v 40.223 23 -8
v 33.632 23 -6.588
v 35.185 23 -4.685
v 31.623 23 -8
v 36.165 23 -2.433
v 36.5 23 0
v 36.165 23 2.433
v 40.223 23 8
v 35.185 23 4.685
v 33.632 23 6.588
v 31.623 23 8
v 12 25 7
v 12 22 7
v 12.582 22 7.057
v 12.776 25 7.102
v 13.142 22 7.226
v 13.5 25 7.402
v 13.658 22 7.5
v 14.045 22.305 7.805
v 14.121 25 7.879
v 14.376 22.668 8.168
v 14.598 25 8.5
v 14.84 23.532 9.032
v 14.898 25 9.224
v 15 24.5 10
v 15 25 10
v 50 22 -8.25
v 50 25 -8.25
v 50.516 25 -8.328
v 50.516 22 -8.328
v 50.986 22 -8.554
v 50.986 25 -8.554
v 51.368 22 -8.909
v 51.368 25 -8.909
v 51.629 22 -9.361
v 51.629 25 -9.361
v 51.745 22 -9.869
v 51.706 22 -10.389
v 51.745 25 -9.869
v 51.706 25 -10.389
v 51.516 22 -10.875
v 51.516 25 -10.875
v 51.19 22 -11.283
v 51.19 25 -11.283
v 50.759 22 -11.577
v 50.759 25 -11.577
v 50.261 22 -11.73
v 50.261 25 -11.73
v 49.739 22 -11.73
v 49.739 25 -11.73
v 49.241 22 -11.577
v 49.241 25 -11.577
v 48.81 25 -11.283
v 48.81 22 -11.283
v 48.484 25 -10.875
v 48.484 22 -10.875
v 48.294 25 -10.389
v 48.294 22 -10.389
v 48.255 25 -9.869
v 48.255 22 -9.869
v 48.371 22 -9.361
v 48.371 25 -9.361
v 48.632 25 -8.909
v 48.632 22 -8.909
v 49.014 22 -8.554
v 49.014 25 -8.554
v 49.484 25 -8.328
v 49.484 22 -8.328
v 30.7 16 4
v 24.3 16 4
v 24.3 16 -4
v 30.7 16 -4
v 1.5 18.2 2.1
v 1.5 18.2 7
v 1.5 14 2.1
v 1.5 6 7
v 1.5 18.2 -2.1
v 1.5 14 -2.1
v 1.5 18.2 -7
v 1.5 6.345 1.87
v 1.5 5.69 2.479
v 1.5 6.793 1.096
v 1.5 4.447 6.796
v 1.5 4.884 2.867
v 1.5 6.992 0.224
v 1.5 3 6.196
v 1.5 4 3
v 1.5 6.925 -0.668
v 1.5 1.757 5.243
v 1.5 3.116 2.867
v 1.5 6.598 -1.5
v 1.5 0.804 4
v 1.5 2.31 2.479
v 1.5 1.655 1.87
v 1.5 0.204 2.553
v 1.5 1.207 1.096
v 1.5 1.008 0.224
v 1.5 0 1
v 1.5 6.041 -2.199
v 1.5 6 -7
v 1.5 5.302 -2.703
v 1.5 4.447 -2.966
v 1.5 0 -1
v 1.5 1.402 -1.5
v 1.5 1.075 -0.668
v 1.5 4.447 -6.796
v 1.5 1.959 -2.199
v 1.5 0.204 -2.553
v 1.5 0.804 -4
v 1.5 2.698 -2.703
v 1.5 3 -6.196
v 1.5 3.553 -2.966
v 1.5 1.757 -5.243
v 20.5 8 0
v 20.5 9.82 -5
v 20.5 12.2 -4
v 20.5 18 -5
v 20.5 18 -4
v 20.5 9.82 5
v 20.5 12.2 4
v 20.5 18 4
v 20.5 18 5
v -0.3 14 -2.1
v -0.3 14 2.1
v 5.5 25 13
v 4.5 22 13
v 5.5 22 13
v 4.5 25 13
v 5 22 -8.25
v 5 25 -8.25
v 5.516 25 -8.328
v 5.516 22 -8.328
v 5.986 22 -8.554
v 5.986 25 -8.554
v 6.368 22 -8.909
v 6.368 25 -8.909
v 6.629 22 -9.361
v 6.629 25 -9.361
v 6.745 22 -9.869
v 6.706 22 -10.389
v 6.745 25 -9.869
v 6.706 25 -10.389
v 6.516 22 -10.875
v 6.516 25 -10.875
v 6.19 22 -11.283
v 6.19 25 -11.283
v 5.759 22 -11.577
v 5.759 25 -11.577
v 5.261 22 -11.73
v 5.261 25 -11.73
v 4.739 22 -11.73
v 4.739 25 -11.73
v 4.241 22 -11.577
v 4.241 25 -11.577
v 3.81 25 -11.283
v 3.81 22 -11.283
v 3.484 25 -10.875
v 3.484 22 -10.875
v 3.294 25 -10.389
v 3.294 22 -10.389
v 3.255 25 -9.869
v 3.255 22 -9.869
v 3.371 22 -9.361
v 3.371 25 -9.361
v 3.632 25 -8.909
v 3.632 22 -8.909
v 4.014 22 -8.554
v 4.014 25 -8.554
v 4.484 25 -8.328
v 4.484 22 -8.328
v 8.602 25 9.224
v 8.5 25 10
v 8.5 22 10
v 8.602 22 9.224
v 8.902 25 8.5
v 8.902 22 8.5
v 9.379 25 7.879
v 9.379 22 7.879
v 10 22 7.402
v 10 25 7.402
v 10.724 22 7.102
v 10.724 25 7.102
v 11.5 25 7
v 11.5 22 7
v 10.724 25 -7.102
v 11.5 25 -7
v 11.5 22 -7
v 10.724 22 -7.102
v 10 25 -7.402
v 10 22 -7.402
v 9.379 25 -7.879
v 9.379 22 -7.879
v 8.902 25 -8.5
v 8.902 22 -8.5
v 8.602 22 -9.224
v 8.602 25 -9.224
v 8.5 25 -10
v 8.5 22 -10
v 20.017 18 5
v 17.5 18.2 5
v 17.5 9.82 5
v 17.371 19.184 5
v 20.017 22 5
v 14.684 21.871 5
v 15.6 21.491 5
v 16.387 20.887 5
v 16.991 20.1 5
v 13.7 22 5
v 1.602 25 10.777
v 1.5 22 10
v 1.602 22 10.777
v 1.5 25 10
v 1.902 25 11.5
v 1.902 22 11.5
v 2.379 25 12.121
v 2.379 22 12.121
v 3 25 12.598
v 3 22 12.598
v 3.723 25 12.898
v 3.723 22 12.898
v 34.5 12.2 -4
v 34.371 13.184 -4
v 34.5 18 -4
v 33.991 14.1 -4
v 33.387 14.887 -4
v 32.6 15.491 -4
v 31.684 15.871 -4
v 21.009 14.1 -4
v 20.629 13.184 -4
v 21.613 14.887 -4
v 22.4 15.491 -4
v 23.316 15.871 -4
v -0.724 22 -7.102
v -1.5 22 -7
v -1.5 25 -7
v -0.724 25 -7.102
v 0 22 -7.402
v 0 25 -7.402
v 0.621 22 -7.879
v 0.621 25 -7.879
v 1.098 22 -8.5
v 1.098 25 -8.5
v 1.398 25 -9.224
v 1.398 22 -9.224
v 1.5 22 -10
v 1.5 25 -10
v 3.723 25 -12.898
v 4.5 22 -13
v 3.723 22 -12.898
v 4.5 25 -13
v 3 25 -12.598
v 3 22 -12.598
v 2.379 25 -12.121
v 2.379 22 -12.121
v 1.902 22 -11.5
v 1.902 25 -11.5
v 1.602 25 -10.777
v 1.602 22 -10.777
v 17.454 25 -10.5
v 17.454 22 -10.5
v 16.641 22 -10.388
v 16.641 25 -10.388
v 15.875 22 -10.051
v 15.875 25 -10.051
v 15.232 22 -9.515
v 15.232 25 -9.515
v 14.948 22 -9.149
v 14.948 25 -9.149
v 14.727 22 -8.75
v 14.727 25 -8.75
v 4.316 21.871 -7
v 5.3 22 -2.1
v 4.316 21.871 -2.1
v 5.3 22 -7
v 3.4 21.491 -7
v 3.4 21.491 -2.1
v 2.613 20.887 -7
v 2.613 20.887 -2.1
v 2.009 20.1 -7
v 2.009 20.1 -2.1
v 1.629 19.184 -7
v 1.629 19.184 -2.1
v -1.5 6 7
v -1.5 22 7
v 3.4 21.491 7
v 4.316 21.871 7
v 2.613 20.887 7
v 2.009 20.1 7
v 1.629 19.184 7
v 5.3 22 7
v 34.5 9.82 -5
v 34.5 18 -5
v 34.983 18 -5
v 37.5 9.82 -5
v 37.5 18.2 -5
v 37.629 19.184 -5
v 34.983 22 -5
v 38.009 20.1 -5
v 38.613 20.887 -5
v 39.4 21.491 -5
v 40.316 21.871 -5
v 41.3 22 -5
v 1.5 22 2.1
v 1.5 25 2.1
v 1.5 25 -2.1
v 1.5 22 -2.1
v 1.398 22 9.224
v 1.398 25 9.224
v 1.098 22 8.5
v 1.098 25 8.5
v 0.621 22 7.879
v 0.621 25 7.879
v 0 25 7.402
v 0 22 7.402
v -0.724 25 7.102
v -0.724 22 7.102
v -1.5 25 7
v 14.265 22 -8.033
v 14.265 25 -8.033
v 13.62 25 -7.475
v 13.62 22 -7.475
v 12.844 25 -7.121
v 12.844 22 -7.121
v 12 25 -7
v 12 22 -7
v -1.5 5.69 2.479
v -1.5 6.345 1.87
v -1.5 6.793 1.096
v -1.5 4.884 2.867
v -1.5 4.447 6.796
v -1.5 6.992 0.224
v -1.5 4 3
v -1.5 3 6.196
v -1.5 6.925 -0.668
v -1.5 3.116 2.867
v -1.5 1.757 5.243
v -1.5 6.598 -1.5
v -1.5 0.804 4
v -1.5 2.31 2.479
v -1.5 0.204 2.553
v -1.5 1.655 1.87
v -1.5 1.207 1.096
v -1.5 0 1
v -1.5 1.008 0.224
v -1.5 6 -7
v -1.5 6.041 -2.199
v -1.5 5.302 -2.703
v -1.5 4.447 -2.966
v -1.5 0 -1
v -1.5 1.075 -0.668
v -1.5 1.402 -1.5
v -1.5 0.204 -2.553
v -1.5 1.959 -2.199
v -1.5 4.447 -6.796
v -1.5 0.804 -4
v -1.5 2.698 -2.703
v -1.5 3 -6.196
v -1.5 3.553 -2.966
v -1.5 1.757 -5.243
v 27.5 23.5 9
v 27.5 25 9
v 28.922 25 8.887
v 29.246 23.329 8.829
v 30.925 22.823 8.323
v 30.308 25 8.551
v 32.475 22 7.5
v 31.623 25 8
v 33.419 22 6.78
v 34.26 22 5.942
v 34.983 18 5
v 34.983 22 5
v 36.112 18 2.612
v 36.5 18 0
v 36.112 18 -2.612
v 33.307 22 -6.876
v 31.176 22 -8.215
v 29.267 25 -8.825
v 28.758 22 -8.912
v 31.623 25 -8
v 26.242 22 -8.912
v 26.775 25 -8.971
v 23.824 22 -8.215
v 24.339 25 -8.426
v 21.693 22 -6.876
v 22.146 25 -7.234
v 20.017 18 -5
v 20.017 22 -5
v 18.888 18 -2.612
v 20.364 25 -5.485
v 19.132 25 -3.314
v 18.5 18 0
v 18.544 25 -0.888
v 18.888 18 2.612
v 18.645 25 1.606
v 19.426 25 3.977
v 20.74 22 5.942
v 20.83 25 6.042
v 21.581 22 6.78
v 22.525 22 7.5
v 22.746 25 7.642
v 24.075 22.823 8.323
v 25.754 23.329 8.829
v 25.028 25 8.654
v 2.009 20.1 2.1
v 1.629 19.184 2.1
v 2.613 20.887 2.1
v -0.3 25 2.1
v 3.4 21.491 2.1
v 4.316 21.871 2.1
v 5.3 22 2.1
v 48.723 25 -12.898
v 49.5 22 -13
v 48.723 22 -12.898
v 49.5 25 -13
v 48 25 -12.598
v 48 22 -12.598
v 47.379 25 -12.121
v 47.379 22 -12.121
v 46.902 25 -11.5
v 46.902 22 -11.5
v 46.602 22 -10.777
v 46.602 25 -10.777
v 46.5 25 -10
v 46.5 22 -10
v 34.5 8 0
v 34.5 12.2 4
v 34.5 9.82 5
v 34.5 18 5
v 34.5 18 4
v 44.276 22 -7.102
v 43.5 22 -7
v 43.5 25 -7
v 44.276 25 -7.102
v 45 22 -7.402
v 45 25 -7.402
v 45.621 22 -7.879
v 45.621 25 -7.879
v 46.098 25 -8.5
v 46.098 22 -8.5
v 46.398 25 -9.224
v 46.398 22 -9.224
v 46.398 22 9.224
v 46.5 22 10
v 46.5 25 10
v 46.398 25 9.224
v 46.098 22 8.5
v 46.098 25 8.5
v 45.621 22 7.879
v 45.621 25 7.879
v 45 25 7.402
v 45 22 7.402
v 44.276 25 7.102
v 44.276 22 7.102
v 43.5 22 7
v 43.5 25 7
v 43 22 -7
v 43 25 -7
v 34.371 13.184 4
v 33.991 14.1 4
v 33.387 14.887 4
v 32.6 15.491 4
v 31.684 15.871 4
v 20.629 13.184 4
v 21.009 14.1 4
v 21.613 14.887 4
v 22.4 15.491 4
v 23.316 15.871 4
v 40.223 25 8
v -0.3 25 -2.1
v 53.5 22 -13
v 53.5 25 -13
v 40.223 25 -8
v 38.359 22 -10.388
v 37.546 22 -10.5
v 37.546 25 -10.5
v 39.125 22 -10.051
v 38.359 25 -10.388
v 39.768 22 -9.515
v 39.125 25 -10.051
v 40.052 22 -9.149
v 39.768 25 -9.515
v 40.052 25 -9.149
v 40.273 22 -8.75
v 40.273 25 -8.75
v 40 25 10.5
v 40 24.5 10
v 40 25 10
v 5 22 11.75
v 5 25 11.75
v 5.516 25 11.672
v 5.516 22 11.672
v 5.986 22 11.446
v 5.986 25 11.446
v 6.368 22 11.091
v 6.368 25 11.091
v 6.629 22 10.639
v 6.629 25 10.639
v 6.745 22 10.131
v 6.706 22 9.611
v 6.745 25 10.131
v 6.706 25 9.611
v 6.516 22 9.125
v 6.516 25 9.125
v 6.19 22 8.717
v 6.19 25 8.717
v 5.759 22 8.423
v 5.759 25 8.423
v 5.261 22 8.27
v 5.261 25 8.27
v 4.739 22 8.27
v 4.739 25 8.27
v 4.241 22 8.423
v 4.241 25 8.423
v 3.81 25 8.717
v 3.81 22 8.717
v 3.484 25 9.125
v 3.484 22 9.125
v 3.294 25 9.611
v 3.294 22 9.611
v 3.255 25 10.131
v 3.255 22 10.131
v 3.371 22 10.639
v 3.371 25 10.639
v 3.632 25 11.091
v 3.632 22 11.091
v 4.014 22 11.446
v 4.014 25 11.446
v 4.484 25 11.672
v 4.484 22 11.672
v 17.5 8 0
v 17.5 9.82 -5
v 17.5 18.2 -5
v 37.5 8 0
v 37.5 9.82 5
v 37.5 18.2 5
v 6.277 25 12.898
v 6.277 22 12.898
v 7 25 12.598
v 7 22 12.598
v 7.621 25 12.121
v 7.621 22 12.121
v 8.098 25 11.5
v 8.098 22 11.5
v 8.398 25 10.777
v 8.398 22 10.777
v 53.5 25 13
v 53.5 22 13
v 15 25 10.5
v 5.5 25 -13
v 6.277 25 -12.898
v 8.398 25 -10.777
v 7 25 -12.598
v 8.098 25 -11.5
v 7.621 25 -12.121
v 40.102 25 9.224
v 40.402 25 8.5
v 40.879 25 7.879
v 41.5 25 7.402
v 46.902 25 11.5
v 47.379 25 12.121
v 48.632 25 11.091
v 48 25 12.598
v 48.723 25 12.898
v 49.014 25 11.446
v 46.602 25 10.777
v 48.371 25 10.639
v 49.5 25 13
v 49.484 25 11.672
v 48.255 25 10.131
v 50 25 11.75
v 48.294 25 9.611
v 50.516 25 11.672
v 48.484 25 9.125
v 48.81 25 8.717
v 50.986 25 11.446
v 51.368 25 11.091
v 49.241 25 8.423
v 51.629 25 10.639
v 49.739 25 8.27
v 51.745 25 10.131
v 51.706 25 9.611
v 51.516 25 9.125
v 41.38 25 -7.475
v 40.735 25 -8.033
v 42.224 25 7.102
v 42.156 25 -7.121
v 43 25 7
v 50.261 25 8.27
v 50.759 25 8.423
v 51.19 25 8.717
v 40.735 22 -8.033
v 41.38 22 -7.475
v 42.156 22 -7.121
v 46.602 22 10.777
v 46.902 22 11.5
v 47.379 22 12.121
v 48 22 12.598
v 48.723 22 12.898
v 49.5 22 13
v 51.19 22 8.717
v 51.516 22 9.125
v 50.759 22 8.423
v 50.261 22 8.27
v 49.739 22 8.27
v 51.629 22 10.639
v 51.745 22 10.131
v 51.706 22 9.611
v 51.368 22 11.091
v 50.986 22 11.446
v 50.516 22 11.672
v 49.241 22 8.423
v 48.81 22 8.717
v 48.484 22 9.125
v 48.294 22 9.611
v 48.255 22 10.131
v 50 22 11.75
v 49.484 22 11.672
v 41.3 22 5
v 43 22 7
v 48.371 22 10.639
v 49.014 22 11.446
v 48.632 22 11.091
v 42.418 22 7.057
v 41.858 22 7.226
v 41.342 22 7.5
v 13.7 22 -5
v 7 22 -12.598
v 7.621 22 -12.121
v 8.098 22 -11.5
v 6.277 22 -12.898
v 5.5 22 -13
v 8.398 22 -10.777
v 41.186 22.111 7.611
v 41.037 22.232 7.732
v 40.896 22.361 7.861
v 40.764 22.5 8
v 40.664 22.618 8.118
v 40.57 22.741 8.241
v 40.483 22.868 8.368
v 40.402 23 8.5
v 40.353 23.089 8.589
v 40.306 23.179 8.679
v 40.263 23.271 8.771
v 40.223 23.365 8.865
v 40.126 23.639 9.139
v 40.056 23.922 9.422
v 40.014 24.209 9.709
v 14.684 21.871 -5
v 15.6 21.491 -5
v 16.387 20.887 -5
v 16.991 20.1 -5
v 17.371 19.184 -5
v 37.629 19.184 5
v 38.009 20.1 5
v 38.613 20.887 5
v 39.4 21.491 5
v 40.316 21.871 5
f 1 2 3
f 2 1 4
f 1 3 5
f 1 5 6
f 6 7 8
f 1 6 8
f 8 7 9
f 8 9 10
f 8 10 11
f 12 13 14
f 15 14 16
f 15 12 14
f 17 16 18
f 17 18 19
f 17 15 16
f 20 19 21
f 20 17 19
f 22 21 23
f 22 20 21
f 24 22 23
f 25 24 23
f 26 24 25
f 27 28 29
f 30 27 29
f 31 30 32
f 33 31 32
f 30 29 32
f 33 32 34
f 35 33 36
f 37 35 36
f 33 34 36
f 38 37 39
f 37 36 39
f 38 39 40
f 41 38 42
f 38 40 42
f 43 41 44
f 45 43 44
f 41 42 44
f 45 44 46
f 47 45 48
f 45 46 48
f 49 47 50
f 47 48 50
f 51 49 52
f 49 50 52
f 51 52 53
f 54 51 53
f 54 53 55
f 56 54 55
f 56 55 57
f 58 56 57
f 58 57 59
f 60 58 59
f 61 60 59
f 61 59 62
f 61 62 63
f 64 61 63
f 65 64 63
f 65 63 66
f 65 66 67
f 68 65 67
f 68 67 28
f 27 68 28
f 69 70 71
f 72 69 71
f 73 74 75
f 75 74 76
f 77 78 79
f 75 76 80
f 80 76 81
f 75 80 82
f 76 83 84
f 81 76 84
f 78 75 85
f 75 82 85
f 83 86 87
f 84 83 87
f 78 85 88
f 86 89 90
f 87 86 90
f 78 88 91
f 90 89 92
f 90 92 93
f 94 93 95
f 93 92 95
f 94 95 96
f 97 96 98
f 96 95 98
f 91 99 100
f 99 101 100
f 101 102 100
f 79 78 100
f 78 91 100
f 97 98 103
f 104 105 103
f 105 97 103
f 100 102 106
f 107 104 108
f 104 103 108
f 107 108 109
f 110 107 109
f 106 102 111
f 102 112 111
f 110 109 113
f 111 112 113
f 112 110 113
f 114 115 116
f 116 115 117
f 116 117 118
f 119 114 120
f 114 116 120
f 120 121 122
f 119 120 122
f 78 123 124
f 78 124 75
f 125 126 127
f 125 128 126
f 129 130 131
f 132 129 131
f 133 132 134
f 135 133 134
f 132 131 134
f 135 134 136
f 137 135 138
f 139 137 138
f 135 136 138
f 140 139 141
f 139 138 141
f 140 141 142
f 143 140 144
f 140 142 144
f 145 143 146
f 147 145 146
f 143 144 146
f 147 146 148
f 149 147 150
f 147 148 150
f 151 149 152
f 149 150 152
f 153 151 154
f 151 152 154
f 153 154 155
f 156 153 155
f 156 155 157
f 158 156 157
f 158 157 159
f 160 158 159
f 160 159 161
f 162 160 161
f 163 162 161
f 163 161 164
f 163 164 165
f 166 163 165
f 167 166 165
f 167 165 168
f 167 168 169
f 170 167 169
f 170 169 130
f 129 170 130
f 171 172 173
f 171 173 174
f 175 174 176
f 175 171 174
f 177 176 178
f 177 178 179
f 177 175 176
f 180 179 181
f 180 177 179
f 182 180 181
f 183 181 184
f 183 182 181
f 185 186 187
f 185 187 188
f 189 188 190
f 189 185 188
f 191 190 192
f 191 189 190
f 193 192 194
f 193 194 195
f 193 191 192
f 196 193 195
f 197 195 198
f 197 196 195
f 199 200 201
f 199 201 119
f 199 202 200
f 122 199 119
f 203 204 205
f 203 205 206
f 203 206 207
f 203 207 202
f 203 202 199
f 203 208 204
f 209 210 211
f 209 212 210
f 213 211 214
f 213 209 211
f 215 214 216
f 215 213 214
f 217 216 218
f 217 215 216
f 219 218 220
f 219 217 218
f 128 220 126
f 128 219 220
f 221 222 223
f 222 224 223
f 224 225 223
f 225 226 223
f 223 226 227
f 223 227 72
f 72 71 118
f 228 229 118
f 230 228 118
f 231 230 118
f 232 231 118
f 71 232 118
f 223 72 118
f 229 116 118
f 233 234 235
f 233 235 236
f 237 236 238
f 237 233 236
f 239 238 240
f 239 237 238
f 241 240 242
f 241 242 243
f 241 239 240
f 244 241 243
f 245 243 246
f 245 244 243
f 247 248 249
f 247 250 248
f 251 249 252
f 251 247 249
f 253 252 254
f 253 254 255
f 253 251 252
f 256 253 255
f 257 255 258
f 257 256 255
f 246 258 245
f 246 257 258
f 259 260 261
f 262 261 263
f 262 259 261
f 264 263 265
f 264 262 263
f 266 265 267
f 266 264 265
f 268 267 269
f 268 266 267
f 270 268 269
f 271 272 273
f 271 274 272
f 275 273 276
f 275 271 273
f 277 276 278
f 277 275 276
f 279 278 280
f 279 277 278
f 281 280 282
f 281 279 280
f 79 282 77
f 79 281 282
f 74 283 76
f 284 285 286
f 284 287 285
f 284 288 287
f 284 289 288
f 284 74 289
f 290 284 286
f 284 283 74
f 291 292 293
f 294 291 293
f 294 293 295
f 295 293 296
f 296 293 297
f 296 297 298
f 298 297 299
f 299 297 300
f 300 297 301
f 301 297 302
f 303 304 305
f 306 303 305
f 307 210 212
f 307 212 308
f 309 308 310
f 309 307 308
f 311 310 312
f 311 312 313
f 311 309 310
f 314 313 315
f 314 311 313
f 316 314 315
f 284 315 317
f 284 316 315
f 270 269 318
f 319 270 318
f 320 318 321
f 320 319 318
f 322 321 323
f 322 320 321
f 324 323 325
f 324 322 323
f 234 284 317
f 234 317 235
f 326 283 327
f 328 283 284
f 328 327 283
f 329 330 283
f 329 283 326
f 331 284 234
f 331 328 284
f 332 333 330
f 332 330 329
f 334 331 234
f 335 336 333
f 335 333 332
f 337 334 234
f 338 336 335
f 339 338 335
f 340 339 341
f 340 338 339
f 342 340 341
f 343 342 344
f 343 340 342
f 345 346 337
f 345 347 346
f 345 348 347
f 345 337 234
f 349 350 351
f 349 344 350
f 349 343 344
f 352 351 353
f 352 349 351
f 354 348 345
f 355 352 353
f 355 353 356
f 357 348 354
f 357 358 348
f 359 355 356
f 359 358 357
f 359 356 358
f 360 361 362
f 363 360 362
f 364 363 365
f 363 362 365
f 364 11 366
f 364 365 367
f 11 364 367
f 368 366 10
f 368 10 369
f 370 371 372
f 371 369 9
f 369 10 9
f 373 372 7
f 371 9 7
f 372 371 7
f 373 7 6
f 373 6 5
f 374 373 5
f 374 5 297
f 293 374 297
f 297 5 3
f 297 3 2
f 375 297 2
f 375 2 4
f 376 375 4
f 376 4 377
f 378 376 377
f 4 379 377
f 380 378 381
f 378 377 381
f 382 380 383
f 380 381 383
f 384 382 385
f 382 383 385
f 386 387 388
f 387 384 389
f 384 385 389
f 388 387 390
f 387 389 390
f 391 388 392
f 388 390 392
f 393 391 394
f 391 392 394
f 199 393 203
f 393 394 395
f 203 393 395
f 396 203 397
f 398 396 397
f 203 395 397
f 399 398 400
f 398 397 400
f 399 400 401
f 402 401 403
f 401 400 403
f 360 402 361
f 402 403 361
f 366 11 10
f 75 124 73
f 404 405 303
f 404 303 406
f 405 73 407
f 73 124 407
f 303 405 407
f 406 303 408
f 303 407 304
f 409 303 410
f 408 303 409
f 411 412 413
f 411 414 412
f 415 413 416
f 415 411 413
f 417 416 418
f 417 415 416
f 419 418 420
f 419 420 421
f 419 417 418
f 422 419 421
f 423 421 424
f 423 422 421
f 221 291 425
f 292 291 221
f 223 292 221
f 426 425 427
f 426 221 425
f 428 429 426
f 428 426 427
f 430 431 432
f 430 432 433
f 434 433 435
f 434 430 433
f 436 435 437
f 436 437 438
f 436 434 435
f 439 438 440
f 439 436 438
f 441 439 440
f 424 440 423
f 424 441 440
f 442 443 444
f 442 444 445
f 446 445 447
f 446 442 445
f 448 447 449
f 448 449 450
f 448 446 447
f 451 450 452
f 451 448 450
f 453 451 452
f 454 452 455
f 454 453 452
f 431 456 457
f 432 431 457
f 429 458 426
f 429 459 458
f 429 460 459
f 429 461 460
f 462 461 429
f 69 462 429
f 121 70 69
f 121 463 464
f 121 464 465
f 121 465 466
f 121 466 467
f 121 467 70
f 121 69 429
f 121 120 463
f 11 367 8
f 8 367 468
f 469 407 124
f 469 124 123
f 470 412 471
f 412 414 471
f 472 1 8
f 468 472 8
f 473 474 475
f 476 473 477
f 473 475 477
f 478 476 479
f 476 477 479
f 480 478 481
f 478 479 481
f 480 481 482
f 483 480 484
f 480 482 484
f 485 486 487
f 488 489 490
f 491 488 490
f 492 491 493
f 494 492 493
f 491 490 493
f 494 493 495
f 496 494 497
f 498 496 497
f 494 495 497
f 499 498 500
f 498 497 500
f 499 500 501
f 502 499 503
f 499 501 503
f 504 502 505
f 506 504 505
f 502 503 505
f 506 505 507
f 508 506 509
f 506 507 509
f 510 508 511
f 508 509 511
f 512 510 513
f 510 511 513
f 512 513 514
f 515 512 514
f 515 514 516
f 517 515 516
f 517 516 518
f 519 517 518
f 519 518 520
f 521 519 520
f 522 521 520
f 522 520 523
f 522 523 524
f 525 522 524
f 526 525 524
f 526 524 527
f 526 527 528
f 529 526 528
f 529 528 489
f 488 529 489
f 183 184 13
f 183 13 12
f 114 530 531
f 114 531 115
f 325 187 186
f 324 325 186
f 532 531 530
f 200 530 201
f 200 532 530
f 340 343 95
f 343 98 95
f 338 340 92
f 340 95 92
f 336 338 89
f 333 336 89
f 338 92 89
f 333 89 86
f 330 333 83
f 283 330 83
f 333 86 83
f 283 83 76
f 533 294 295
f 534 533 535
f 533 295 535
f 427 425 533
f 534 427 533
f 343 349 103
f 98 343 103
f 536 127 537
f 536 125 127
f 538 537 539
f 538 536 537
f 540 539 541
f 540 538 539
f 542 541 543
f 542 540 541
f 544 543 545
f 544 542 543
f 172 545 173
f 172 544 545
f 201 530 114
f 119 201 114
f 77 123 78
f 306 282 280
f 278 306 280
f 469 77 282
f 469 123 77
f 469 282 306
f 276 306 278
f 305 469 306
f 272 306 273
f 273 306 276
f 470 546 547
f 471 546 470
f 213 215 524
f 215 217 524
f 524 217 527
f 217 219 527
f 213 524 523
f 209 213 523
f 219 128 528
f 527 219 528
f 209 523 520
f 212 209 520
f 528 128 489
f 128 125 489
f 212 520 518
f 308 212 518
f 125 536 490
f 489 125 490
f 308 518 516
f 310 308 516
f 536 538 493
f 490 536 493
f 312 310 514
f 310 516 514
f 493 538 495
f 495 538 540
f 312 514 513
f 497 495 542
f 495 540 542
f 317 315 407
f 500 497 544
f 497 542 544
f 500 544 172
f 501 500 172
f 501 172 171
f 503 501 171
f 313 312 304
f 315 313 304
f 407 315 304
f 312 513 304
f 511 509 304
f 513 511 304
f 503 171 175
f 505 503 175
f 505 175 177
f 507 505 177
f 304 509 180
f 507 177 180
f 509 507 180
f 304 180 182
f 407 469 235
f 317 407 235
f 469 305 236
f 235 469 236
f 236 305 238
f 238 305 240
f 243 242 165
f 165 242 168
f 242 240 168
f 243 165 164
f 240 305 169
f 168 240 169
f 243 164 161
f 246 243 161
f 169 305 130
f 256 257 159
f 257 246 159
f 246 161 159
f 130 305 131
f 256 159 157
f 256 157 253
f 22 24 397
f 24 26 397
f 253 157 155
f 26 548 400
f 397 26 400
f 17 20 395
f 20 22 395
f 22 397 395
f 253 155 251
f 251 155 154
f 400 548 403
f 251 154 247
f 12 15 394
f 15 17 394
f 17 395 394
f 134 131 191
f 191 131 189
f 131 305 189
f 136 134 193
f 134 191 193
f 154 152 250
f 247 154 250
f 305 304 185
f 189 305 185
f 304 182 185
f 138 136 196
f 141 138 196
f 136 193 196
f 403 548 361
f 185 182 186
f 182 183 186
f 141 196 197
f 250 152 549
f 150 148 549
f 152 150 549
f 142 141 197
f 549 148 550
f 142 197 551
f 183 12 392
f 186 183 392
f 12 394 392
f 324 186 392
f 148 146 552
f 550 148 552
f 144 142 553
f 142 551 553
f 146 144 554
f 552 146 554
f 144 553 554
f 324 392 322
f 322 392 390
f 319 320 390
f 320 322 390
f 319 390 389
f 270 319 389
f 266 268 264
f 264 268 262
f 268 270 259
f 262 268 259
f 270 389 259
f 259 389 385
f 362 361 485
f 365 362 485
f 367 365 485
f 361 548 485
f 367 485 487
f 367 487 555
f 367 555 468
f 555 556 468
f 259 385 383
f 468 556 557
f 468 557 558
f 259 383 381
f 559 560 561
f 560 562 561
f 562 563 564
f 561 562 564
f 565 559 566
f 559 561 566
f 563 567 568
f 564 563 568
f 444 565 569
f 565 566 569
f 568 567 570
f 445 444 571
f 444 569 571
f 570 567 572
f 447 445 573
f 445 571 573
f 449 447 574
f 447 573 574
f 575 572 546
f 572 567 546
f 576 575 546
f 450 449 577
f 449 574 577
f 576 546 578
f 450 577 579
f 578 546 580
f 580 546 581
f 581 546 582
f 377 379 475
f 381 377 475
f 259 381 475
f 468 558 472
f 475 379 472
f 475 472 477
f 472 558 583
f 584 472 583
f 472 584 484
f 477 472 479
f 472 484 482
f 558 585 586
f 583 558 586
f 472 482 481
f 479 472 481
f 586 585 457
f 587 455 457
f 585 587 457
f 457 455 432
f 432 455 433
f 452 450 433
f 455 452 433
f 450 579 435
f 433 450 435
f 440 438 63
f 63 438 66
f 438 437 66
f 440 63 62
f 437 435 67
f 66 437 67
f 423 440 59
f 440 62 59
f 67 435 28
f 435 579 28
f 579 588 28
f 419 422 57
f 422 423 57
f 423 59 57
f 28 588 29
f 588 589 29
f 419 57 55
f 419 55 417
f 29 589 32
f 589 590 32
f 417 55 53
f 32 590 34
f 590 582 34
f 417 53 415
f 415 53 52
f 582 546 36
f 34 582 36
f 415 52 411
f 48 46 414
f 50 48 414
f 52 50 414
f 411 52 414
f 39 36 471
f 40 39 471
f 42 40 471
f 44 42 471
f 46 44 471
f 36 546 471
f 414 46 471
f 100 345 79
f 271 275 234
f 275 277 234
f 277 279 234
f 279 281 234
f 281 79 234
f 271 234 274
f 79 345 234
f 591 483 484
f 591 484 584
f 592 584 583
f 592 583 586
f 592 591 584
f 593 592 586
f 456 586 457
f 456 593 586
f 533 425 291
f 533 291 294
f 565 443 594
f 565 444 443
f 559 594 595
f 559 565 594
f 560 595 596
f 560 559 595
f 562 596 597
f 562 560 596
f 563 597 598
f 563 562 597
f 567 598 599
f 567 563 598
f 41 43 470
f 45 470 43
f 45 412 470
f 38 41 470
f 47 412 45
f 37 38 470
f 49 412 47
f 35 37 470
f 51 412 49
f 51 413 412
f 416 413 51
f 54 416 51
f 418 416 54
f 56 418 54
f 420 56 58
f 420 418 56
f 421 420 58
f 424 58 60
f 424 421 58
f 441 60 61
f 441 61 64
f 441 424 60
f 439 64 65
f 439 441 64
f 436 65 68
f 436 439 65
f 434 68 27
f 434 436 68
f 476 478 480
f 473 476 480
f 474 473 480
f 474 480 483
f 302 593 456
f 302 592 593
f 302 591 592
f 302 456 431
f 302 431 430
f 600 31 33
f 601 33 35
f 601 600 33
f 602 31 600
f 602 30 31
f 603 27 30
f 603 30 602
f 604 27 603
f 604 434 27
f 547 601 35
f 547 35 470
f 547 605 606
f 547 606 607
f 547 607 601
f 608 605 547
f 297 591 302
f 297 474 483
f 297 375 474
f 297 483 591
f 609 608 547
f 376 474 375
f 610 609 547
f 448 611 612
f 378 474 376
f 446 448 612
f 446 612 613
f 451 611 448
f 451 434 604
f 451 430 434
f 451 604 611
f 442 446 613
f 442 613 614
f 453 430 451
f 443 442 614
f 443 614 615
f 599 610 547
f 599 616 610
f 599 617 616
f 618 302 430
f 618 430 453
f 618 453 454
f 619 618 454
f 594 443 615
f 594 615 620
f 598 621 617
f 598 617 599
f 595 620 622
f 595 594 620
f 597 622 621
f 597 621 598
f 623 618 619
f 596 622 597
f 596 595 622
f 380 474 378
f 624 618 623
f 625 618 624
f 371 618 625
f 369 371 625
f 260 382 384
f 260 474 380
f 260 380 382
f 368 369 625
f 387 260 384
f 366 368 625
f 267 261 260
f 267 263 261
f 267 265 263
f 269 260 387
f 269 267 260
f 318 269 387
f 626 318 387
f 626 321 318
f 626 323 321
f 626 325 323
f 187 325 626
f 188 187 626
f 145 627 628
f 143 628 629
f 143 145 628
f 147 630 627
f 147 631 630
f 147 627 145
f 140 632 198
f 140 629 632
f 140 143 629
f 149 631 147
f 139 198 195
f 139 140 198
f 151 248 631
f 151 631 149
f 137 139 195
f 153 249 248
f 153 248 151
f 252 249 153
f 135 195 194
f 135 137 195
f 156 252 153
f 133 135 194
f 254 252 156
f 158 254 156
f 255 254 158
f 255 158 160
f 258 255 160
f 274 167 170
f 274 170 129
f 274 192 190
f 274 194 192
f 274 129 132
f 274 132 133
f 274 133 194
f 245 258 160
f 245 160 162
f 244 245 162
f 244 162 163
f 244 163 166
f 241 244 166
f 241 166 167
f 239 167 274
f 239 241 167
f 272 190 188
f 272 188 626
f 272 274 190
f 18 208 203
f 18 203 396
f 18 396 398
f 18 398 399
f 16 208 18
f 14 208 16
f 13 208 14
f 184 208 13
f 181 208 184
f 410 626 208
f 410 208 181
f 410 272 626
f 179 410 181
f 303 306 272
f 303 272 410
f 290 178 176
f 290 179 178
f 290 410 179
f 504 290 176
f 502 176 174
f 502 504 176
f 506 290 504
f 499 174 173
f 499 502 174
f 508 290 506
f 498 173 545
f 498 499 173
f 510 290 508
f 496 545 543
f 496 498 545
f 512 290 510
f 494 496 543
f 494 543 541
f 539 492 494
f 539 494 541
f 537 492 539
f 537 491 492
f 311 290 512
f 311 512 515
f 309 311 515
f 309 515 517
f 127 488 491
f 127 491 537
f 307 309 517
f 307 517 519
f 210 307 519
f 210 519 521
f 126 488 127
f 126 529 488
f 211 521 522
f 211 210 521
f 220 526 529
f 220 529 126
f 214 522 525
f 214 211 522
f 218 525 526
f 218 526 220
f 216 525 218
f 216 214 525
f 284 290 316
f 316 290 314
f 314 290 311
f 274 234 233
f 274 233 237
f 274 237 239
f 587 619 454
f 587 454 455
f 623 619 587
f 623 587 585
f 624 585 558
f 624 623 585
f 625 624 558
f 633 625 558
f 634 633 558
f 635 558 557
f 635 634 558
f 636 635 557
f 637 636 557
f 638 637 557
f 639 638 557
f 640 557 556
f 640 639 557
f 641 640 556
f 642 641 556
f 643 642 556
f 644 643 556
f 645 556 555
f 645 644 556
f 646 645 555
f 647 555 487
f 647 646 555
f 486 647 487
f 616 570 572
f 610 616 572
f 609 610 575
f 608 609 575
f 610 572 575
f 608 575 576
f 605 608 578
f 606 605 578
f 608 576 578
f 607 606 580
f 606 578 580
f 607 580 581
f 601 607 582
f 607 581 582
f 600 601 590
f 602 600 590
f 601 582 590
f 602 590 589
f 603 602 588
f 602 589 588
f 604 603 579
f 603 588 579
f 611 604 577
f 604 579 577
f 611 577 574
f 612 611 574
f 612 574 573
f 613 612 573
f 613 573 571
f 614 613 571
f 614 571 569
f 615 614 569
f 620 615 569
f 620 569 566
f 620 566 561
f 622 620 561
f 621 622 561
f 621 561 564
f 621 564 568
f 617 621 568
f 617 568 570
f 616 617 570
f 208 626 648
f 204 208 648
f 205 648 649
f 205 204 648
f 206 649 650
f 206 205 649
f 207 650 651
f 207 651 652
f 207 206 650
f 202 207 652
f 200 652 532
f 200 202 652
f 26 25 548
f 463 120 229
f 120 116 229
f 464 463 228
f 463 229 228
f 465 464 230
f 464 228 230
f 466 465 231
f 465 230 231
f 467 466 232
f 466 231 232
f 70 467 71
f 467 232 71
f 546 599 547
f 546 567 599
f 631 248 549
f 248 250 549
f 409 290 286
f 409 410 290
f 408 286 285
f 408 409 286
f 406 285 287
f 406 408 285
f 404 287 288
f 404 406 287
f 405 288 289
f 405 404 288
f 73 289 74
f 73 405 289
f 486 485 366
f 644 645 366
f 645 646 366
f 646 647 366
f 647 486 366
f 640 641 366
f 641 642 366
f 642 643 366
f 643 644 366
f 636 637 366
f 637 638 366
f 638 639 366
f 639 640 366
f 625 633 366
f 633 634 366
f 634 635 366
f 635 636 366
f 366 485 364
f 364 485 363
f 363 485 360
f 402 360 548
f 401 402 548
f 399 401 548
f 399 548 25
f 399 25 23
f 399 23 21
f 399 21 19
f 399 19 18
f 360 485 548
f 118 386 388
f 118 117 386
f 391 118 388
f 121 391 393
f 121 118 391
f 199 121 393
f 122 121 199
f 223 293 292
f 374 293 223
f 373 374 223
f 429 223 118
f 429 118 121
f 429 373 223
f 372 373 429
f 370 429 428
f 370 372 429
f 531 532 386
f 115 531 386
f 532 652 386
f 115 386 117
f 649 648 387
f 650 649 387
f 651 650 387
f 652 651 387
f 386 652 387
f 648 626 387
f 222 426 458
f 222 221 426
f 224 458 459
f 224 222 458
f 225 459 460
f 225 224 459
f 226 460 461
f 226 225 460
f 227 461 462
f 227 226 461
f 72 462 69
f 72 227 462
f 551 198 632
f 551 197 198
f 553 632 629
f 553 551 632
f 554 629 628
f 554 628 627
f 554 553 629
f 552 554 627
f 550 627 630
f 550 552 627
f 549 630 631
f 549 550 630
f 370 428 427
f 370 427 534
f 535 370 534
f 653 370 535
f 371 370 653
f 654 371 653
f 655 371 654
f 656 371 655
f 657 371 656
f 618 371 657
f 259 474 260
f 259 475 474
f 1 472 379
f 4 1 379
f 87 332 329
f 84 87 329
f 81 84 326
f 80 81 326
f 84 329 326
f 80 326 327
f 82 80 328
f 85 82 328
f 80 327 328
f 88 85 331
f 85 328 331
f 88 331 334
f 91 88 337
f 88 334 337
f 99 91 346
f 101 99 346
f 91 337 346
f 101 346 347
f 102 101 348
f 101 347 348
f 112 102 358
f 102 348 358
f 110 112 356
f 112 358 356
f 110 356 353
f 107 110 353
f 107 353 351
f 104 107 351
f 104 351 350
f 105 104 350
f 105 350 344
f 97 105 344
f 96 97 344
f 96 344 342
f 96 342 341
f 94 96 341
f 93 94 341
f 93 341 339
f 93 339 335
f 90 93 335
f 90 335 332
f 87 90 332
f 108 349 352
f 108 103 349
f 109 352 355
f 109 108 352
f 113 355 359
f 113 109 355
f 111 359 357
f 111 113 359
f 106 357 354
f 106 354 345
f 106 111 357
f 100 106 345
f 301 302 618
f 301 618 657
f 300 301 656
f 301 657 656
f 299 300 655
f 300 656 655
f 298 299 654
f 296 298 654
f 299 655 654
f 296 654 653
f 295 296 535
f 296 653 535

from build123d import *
from OCP.BRepFilletAPI import BRepFilletAPI_MakeChamfer

# Parameters (mm, degrees)
SKETCH1_W           = 3
SKETCH1_H           = 14
BOSS_EXTRUDE1_DEPTH = 25
SKETCH2_R           = 3
CUT_EXTRUDE1_DEPTH  = 27.134268691
SKETCH3_W           = 14
SKETCH3_H           = 3
BOSS_EXTRUDE2_DEPTH = 52
SKETCH4_W           = 3
SKETCH4_H           = 10
BOSS_EXTRUDE3_DEPTH = 14
CHAMFER1_SIZE       = 1.819851171
CHAMFER1_SIZE_2     = 5
SKETCH6_W           = 25
SKETCH6_H           = 3
BOSS_EXTRUDE5_DEPTH = 3.5
SKETCH5_W           = 7
SKETCH5_H           = 3
BOSS_EXTRUDE4_DEPTH = 6
SKETCH7_R           = 9
CUT_EXTRUDE2_DEPTH  = 7
CHAMFER2_SIZE       = 3
SKETCH8_W           = 8
SKETCH8_H           = 2
BOSS_EXTRUDE6_DEPTH = 14
SKETCH9_W           = 8.6
SKETCH9_H           = 16
CUT_EXTRUDE3_DEPTH  = 2
CUT_EXTRUDE4_REACH  = 62.467
SKETCH10_R          = 1.75
SKETCH11_W          = 1.8
SKETCH11_H          = 4.2
CUT_EXTRUDE5_DEPTH  = 11
FILLET1_R           = 3
FILLET2_R           = 3
FILLET3_R           = 3.8
FILLET4_R           = 6


# Some blends are built 0.0001 mm under size
with BuildPart() as part:
    # Sketch1 → Boss-Extrude1 (new body)
    with BuildSketch(Plane(origin=(0, 0, 0), x_dir=(1, 0, 0), z_dir=(0, 1, 0))):
        Rectangle(SKETCH1_W, SKETCH1_H)
    extrude(amount=BOSS_EXTRUDE1_DEPTH)

    # Sketch2 → Cut-Extrude1 (cut, through all)
    with BuildSketch(Plane.ZY.offset(1.5)):
        with Locations((0, 4)):
            Circle(SKETCH2_R)
    extrude(amount=-CUT_EXTRUDE1_DEPTH, mode=Mode.SUBTRACT)

    # Sketch3 → Boss-Extrude2 (add)
    with BuildSketch(Plane(origin=(1.5, 0, 0), x_dir=(0, 0, -1), z_dir=(1, 0, 0))):
        with Locations((0, 23.5)):
            Rectangle(SKETCH3_W, SKETCH3_H)
    extrude(amount=BOSS_EXTRUDE2_DEPTH)

    # Sketch4 → Boss-Extrude3 (add)
    with BuildSketch(Plane.XZ.offset(-22)):
        with Locations((36, 0)):
            Rectangle(SKETCH4_W, SKETCH4_H)
        with Locations((19, 0)):
            Rectangle(SKETCH4_W, SKETCH4_H)
    extrude(amount=BOSS_EXTRUDE3_DEPTH)

    # Chamfer1
    chamfer1_edges_1 = [part.edges().sort_by_distance(p)[0] for p in [
        (36, 8, -5),
    ]]
    chamfer1_side_1 = [part.faces().sort_by_distance(p)[0] for p in [
        (36, 8.036397023, -5),
    ]]
    chamfer1_edges_2 = [part.edges().sort_by_distance(p)[0] for p in [
        (36, 8, 5),
    ]]
    chamfer1_side_2 = [part.faces().sort_by_distance(p)[0] for p in [
        (36, 8.036397023, 5),
    ]]
    chamfer1_edges_3 = [part.edges().sort_by_distance(p)[0] for p in [
        (19, 8, 5),
    ]]
    chamfer1_side_3 = [part.faces().sort_by_distance(p)[0] for p in [
        (19, 8.036397023, 5),
    ]]
    chamfer1_edges_4 = [part.edges().sort_by_distance(p)[0] for p in [
        (19, 8, -5),
    ]]
    chamfer1_side_4 = [part.faces().sort_by_distance(p)[0] for p in [
        (19, 8.036397023, -5),
    ]]
    chamfer1 = BRepFilletAPI_MakeChamfer(part.part.solid().wrapped)
    for e in chamfer1_edges_1:
        chamfer1.Add(CHAMFER1_SIZE - 0.0001, CHAMFER1_SIZE_2 - 0.0001, e.wrapped, chamfer1_side_1[0].wrapped)
    for e in chamfer1_edges_2:
        chamfer1.Add(CHAMFER1_SIZE - 0.0001, CHAMFER1_SIZE_2 - 0.0001, e.wrapped, chamfer1_side_2[0].wrapped)
    for e in chamfer1_edges_3:
        chamfer1.Add(CHAMFER1_SIZE - 0.0001, CHAMFER1_SIZE_2 - 0.0001, e.wrapped, chamfer1_side_3[0].wrapped)
    for e in chamfer1_edges_4:
        chamfer1.Add(CHAMFER1_SIZE - 0.0001, CHAMFER1_SIZE_2 - 0.0001, e.wrapped, chamfer1_side_4[0].wrapped)
    add(Compound.cast(chamfer1.Shape()), mode=Mode.REPLACE)  # a hair under: the kernel refuses the full size

    # Sketch6 → Boss-Extrude5 (add)
    with BuildSketch(Plane(origin=(0, 0, -7), x_dir=(-1, 0, 0), z_dir=(0, 0, -1))):
        with Locations((-27.5, 23.5)):
            Rectangle(SKETCH6_W, SKETCH6_H)
    boss_extrude5 = extrude(amount=BOSS_EXTRUDE5_DEPTH)

    # Sketch5 → Boss-Extrude4 (add)
    with BuildSketch(Plane.XY.offset(7)):
        with Locations((5, 23.5)):
            Rectangle(SKETCH5_W, SKETCH5_H)
        with Locations((50, 23.5)):
            Rectangle(SKETCH5_W, SKETCH5_H)
    boss_extrude4 = extrude(amount=BOSS_EXTRUDE4_DEPTH)

    # Mirror1: Boss-Extrude5, Boss-Extrude4 across plane
    add(boss_extrude5.mirror(Plane.XY))
    add(boss_extrude4.mirror(Plane.XY))

    # Sketch7 → Cut-Extrude2 (cut)
    with BuildSketch(Plane(origin=(0, 25, 0), x_dir=(1, 0, 0), z_dir=(0, 1, 0))):
        with Locations(Location((27.5, 0, 0), (0, 0, 270))):
            Circle(SKETCH7_R)
    extrude(amount=-CUT_EXTRUDE2_DEPTH, mode=Mode.SUBTRACT)

    # Chamfer2
    # the kernel refuses this chamfer: 3 mm, written as the material it takes off along each edge
    with BuildSketch(Plane(origin=(15, 22, 10.5), x_dir=(0, -0.027495876610587926, -0.9996219169112968), z_dir=(1, 0, 0))) as chamfer2_piece_1:
        Polygon((CHAMFER2_SIZE * 0.999621916911, CHAMFER2_SIZE * 0.0274958766106), (-CHAMFER2_SIZE * 0.0274958766106, CHAMFER2_SIZE * 0.999621916911), (0, 0), align=None)
    extrude(amount=25, mode=Mode.SUBTRACT)

    # Sketch8 → Boss-Extrude6 (add)
    with BuildSketch(Plane(origin=(20.5, 0, 0), x_dir=(0, 0, -1), z_dir=(1, 0, 0))):
        with Locations((0, 17)):
            Rectangle(SKETCH8_W, SKETCH8_H)
    extrude(amount=BOSS_EXTRUDE6_DEPTH)

    # Sketch9 → Cut-Extrude3 (cut)
    with BuildSketch(Plane(origin=(0, 25, 0), x_dir=(1, 0, 0), z_dir=(0, 1, 0))):
        with Locations((35.923105626, 0)):
            Rectangle(SKETCH9_W, SKETCH9_H)
    extrude(amount=-CUT_EXTRUDE3_DEPTH, mode=Mode.SUBTRACT)

    # Sketch10 → Cut-Extrude4 (cut, up to next)
    with BuildSketch(Plane(origin=(0, 25, 0), x_dir=(1, 0, 0), z_dir=(0, 1, 0)), mode=Mode.PRIVATE) as cut_extrude4_sk1:
        with Locations(Location((5, -10, 0), (0, 0, 270))):
            Circle(SKETCH10_R)
    cut_extrude4_tool1 = extrude(cut_extrude4_sk1.sketch, amount=-CUT_EXTRUDE4_REACH, mode=Mode.PRIVATE) & part.part
    # Sketch10 → Cut-Extrude4 (cut, up to next)
    with BuildSketch(Plane(origin=(0, 25, 0), x_dir=(1, 0, 0), z_dir=(0, 1, 0)), mode=Mode.PRIVATE) as cut_extrude4_sk2:
        with Locations(Location((50, -10, 0), (0, 0, 270))):
            Circle(SKETCH10_R)
    cut_extrude4_tool2 = extrude(cut_extrude4_sk2.sketch, amount=-CUT_EXTRUDE4_REACH, mode=Mode.PRIVATE) & part.part
    # Sketch10 → Cut-Extrude4 (cut, up to next)
    with BuildSketch(Plane(origin=(0, 25, 0), x_dir=(1, 0, 0), z_dir=(0, 1, 0)), mode=Mode.PRIVATE) as cut_extrude4_sk3:
        with Locations(Location((50, 10, 0), (0, 0, 270))):
            Circle(SKETCH10_R)
    cut_extrude4_tool3 = extrude(cut_extrude4_sk3.sketch, amount=-CUT_EXTRUDE4_REACH, mode=Mode.PRIVATE) & part.part
    # Sketch10 → Cut-Extrude4 (cut, up to next)
    with BuildSketch(Plane(origin=(0, 25, 0), x_dir=(1, 0, 0), z_dir=(0, 1, 0)), mode=Mode.PRIVATE) as cut_extrude4_sk4:
        with Locations(Location((5, 10, 0), (0, 0, 270))):
            Circle(SKETCH10_R)
    cut_extrude4_tool4 = extrude(cut_extrude4_sk4.sketch, amount=-CUT_EXTRUDE4_REACH, mode=Mode.PRIVATE) & part.part
    add(cut_extrude4_tool1.solids().sort_by_distance((5, 25, 10))[0], mode=Mode.SUBTRACT)
    add(cut_extrude4_tool2.solids().sort_by_distance((50, 25, 10))[0], mode=Mode.SUBTRACT)
    add(cut_extrude4_tool3.solids().sort_by_distance((50, 25, -10))[0], mode=Mode.SUBTRACT)
    add(cut_extrude4_tool4.solids().sort_by_distance((5, 25, -10))[0], mode=Mode.SUBTRACT)

    # Sketch11 → Cut-Extrude5 (cut)
    with BuildSketch(Plane(origin=(0, 25, 0), x_dir=(1, 0, 0), z_dir=(0, 1, 0))):
        with Locations((0.6, 0)):
            Rectangle(SKETCH11_W, SKETCH11_H)
    extrude(amount=-CUT_EXTRUDE5_DEPTH, mode=Mode.SUBTRACT)

    # Fillet1
    # the kernel refuses this fillet: 3 mm, written as the material it adds along each edge
    with BuildSketch(Plane(origin=(46.5, 22, 7), x_dir=(0, 0, 1), z_dir=(0, 1, 0)), Plane(origin=(8.5, 25, 7), x_dir=(0, 0, 1), z_dir=(0, -1, 0)), Plane(origin=(1.5, 22, 7), x_dir=(0, 0, 1), z_dir=(0, 1, 0)), Plane(origin=(46.5, 22, -7), x_dir=(-1, 0, 0), z_dir=(0, 1, 0))) as fillet1_piece_1:
        with BuildLine():
            CenterArc((FILLET1_R, -FILLET1_R), FILLET1_R, 90, 90)
            Line((0, -FILLET1_R), (0, 0))
            Line((0, 0), (FILLET1_R, 0))
        make_face()
    extrude(amount=3)
    with BuildSketch(Plane(origin=(40, 22, 7), x_dir=(1, 0, 0), z_dir=(0, 1, 0))) as fillet1_piece_2_section:
        with BuildLine():
            CenterArc((FILLET1_R, -FILLET1_R), FILLET1_R, 90, 90)
            Line((0, -FILLET1_R), (0, 0))
            Line((0, 0), (FILLET1_R, 0))
        make_face()
    fillet1_piece_2 = extrude(amount=8.5, mode=Mode.PRIVATE)
    fillet1_piece_2 = split(fillet1_piece_2, bisect_by=Plane(origin=(40.974089344, 22.187586332, 7.687586332), z_dir=(0, 0.7071067811862648, -0.7071067811868302)), keep=Keep.TOP, mode=Mode.PRIVATE)
    fillet1_piece_2 = split(fillet1_piece_2, bisect_by=Plane(origin=(40.974089344, 25, 7.348410065), z_dir=(0, -1, 0)), keep=Keep.TOP, mode=Mode.PRIVATE)
    fillet1_piece_2 = split(fillet1_piece_2, bisect_by=Plane(origin=(40.223105626, 22.526762599, 7.348410065), z_dir=(1, 0, 0)), keep=Keep.TOP, mode=Mode.PRIVATE)
    add(fillet1_piece_2)
    with BuildSketch(Plane(origin=(40, 22, 7), x_dir=(1, 0, 0), z_dir=(0, 1, 0))) as fillet1_piece_3_section:
        with BuildLine():
            CenterArc((FILLET1_R, -FILLET1_R), FILLET1_R, 90, 90)
            Line((0, -FILLET1_R), (0, 0))
            Line((0, 0), (FILLET1_R, 0))
        make_face()
    fillet1_piece_3 = extrude(amount=1, mode=Mode.PRIVATE)
    fillet1_piece_3 = split(fillet1_piece_3, bisect_by=Plane(origin=(40.111552813, 22.25, 7.75), z_dir=(0, 0.7071067811862648, -0.7071067811868302)), keep=Keep.TOP, mode=Mode.PRIVATE)
    add(fillet1_piece_3)
    with BuildSketch(Plane(origin=(40, 14.5, 7), x_dir=(1, 0, 0), z_dir=(0, 1, 0))) as fillet1_piece_4_section:
        with BuildLine():
            CenterArc((FILLET1_R, -FILLET1_R), FILLET1_R, 90, 90)
            Line((0, -FILLET1_R), (0, 0))
            Line((0, 0), (FILLET1_R, 0))
        make_face()
    fillet1_piece_4 = extrude(amount=16, mode=Mode.PRIVATE)
    fillet1_piece_4 = split(fillet1_piece_4, bisect_by=Plane(origin=(40.102150249, 23.589388324, 9.089388324), z_dir=(0, 0.7071067811862648, -0.7071067811868302)), keep=Keep.TOP, mode=Mode.PRIVATE)
    fillet1_piece_4 = split(fillet1_piece_4, bisect_by=Plane(origin=(40.102150249, 25, 8.580734209), z_dir=(0, -1, 0)), keep=Keep.TOP, mode=Mode.PRIVATE)
    fillet1_piece_4 = split(fillet1_piece_4, bisect_by=Plane(origin=(40.102150249, 24.098042439, 8), z_dir=(0, 0, 1)), keep=Keep.TOP, mode=Mode.PRIVATE)
    add(fillet1_piece_4)
    with BuildSketch(Plane(origin=(15, 25, 7), x_dir=(-1, 0, 0), z_dir=(0, -1, 0))) as fillet1_piece_5_section:
        with BuildLine():
            CenterArc((FILLET1_R, -FILLET1_R), FILLET1_R, 90, 90)
            Line((0, -FILLET1_R), (0, 0))
            Line((0, 0), (FILLET1_R, 0))
        make_face()
    fillet1_piece_5 = extrude(amount=3, mode=Mode.PRIVATE)
    fillet1_piece_5 = split(fillet1_piece_5, bisect_by=Plane(origin=(14.281357865, 22.846943588, 8.346943588), z_dir=(0, 0.7071067811862648, -0.7071067811868302)), keep=Keep.TOP, mode=Mode.PRIVATE)
    add(fillet1_piece_5)
    with BuildSketch(Plane(origin=(1.5, 22, -7), x_dir=(0, 0, -1), z_dir=(0, 1, 0)), Plane(origin=(8.5, 25, -7), x_dir=(0, 0, -1), z_dir=(0, -1, 0)), Plane(origin=(15, 25, -7), x_dir=(-1, 0, 0), z_dir=(0, -1, 0))) as fillet1_piece_6:
        with BuildLine():
            CenterArc((FILLET1_R, FILLET1_R), FILLET1_R, 180, 90)
            Line((0, FILLET1_R), (0, 0))
            Line((0, 0), (FILLET1_R, 0))
        make_face()
    extrude(amount=3)
    with BuildSketch(Plane(origin=(40, 22, -7), x_dir=(0, 0, -1), z_dir=(0, 1, 0))) as fillet1_piece_7_section:
        with BuildLine():
            CenterArc((FILLET1_R, -FILLET1_R), FILLET1_R, 90, 90)
            Line((0, -FILLET1_R), (0, 0))
            Line((0, 0), (FILLET1_R, 0))
        make_face()
    fillet1_piece_7 = extrude(amount=8.5, mode=Mode.PRIVATE)
    fillet1_piece_7 = split(fillet1_piece_7, bisect_by=Plane(origin=(40.097980222, 25, -8.647383522), z_dir=(0, -1, 0)), keep=Keep.TOP, mode=Mode.PRIVATE)
    fillet1_piece_7 = split(fillet1_piece_7, bisect_by=Plane(origin=(40.097980222, 22.5, -8), z_dir=(0, 0, -1)), keep=Keep.TOP, mode=Mode.PRIVATE)
    add(fillet1_piece_7)
    with BuildSketch(Plane(origin=(40, 22, -7), x_dir=(0, 0, -1), z_dir=(0, 1, 0))) as fillet1_piece_8:
        with BuildLine():
            CenterArc((FILLET1_R, -FILLET1_R), FILLET1_R, 90, 90)
            Line((0, -FILLET1_R), (0, 0))
            Line((0, 0), (FILLET1_R, 0))
        make_face()
    extrude(amount=1)
    with BuildSketch(Plane(origin=(40, 14.5, -7), x_dir=(0, 0, -1), z_dir=(0, 1, 0))) as fillet1_piece_9_section:
        with BuildLine():
            CenterArc((FILLET1_R, -FILLET1_R), FILLET1_R, 90, 90)
            Line((0, -FILLET1_R), (0, 0))
            Line((0, 0), (FILLET1_R, 0))
        make_face()
    fillet1_piece_9 = extrude(amount=16, mode=Mode.PRIVATE)
    fillet1_piece_9 = split(fillet1_piece_9, bisect_by=Plane(origin=(40.946316816, 25, -7.381877422), z_dir=(0, -1, 0)), keep=Keep.TOP, mode=Mode.PRIVATE)
    fillet1_piece_9 = split(fillet1_piece_9, bisect_by=Plane(origin=(40.946316816, 23, -7.381877422), z_dir=(0, 1, 0)), keep=Keep.TOP, mode=Mode.PRIVATE)
    fillet1_piece_9 = split(fillet1_piece_9, bisect_by=Plane(origin=(40.223105626, 24, -7.381877422), z_dir=(1, 0, 0)), keep=Keep.TOP, mode=Mode.PRIVATE)
    add(fillet1_piece_9)

    # Fillet2
    fillet2_edges = [part.edges().sort_by_distance(p)[0] for p in [
        (46.5, 23.5, 13),
        (46.5, 23.5, -13),
        (40, 23.5, -10.5),
        (15, 23.5, -10.5),
        (8.5, 23.5, 13),
        (1.5, 23.5, 13),
        (1.5, 23.5, -13),
        (8.5, 23.5, -13),
    ]]
    fillet(fillet2_edges, radius=FILLET2_R - 0.0001)  # a hair under: the kernel refuses the full size

    # Fillet3
    fillet3_edges = [part.edges().sort_by_distance(p)[0] for p in [
        (20.5, 16, 0),
        (34.5, 16, 0),
        (1.5, 22, 4.55),
        (1.5, 22, -4.55),
        (17.5, 22, 0),
        (37.5, 22, 0),
    ]]
    fillet(fillet3_edges, radius=FILLET3_R)

    # Fillet4
    fillet4_edges = [part.edges().sort_by_distance(p)[0] for p in [
        (0, 0, 7),
        (0, 0, -7),
    ]]
    fillet(fillet4_edges, radius=FILLET4_R)


solid = part.part
